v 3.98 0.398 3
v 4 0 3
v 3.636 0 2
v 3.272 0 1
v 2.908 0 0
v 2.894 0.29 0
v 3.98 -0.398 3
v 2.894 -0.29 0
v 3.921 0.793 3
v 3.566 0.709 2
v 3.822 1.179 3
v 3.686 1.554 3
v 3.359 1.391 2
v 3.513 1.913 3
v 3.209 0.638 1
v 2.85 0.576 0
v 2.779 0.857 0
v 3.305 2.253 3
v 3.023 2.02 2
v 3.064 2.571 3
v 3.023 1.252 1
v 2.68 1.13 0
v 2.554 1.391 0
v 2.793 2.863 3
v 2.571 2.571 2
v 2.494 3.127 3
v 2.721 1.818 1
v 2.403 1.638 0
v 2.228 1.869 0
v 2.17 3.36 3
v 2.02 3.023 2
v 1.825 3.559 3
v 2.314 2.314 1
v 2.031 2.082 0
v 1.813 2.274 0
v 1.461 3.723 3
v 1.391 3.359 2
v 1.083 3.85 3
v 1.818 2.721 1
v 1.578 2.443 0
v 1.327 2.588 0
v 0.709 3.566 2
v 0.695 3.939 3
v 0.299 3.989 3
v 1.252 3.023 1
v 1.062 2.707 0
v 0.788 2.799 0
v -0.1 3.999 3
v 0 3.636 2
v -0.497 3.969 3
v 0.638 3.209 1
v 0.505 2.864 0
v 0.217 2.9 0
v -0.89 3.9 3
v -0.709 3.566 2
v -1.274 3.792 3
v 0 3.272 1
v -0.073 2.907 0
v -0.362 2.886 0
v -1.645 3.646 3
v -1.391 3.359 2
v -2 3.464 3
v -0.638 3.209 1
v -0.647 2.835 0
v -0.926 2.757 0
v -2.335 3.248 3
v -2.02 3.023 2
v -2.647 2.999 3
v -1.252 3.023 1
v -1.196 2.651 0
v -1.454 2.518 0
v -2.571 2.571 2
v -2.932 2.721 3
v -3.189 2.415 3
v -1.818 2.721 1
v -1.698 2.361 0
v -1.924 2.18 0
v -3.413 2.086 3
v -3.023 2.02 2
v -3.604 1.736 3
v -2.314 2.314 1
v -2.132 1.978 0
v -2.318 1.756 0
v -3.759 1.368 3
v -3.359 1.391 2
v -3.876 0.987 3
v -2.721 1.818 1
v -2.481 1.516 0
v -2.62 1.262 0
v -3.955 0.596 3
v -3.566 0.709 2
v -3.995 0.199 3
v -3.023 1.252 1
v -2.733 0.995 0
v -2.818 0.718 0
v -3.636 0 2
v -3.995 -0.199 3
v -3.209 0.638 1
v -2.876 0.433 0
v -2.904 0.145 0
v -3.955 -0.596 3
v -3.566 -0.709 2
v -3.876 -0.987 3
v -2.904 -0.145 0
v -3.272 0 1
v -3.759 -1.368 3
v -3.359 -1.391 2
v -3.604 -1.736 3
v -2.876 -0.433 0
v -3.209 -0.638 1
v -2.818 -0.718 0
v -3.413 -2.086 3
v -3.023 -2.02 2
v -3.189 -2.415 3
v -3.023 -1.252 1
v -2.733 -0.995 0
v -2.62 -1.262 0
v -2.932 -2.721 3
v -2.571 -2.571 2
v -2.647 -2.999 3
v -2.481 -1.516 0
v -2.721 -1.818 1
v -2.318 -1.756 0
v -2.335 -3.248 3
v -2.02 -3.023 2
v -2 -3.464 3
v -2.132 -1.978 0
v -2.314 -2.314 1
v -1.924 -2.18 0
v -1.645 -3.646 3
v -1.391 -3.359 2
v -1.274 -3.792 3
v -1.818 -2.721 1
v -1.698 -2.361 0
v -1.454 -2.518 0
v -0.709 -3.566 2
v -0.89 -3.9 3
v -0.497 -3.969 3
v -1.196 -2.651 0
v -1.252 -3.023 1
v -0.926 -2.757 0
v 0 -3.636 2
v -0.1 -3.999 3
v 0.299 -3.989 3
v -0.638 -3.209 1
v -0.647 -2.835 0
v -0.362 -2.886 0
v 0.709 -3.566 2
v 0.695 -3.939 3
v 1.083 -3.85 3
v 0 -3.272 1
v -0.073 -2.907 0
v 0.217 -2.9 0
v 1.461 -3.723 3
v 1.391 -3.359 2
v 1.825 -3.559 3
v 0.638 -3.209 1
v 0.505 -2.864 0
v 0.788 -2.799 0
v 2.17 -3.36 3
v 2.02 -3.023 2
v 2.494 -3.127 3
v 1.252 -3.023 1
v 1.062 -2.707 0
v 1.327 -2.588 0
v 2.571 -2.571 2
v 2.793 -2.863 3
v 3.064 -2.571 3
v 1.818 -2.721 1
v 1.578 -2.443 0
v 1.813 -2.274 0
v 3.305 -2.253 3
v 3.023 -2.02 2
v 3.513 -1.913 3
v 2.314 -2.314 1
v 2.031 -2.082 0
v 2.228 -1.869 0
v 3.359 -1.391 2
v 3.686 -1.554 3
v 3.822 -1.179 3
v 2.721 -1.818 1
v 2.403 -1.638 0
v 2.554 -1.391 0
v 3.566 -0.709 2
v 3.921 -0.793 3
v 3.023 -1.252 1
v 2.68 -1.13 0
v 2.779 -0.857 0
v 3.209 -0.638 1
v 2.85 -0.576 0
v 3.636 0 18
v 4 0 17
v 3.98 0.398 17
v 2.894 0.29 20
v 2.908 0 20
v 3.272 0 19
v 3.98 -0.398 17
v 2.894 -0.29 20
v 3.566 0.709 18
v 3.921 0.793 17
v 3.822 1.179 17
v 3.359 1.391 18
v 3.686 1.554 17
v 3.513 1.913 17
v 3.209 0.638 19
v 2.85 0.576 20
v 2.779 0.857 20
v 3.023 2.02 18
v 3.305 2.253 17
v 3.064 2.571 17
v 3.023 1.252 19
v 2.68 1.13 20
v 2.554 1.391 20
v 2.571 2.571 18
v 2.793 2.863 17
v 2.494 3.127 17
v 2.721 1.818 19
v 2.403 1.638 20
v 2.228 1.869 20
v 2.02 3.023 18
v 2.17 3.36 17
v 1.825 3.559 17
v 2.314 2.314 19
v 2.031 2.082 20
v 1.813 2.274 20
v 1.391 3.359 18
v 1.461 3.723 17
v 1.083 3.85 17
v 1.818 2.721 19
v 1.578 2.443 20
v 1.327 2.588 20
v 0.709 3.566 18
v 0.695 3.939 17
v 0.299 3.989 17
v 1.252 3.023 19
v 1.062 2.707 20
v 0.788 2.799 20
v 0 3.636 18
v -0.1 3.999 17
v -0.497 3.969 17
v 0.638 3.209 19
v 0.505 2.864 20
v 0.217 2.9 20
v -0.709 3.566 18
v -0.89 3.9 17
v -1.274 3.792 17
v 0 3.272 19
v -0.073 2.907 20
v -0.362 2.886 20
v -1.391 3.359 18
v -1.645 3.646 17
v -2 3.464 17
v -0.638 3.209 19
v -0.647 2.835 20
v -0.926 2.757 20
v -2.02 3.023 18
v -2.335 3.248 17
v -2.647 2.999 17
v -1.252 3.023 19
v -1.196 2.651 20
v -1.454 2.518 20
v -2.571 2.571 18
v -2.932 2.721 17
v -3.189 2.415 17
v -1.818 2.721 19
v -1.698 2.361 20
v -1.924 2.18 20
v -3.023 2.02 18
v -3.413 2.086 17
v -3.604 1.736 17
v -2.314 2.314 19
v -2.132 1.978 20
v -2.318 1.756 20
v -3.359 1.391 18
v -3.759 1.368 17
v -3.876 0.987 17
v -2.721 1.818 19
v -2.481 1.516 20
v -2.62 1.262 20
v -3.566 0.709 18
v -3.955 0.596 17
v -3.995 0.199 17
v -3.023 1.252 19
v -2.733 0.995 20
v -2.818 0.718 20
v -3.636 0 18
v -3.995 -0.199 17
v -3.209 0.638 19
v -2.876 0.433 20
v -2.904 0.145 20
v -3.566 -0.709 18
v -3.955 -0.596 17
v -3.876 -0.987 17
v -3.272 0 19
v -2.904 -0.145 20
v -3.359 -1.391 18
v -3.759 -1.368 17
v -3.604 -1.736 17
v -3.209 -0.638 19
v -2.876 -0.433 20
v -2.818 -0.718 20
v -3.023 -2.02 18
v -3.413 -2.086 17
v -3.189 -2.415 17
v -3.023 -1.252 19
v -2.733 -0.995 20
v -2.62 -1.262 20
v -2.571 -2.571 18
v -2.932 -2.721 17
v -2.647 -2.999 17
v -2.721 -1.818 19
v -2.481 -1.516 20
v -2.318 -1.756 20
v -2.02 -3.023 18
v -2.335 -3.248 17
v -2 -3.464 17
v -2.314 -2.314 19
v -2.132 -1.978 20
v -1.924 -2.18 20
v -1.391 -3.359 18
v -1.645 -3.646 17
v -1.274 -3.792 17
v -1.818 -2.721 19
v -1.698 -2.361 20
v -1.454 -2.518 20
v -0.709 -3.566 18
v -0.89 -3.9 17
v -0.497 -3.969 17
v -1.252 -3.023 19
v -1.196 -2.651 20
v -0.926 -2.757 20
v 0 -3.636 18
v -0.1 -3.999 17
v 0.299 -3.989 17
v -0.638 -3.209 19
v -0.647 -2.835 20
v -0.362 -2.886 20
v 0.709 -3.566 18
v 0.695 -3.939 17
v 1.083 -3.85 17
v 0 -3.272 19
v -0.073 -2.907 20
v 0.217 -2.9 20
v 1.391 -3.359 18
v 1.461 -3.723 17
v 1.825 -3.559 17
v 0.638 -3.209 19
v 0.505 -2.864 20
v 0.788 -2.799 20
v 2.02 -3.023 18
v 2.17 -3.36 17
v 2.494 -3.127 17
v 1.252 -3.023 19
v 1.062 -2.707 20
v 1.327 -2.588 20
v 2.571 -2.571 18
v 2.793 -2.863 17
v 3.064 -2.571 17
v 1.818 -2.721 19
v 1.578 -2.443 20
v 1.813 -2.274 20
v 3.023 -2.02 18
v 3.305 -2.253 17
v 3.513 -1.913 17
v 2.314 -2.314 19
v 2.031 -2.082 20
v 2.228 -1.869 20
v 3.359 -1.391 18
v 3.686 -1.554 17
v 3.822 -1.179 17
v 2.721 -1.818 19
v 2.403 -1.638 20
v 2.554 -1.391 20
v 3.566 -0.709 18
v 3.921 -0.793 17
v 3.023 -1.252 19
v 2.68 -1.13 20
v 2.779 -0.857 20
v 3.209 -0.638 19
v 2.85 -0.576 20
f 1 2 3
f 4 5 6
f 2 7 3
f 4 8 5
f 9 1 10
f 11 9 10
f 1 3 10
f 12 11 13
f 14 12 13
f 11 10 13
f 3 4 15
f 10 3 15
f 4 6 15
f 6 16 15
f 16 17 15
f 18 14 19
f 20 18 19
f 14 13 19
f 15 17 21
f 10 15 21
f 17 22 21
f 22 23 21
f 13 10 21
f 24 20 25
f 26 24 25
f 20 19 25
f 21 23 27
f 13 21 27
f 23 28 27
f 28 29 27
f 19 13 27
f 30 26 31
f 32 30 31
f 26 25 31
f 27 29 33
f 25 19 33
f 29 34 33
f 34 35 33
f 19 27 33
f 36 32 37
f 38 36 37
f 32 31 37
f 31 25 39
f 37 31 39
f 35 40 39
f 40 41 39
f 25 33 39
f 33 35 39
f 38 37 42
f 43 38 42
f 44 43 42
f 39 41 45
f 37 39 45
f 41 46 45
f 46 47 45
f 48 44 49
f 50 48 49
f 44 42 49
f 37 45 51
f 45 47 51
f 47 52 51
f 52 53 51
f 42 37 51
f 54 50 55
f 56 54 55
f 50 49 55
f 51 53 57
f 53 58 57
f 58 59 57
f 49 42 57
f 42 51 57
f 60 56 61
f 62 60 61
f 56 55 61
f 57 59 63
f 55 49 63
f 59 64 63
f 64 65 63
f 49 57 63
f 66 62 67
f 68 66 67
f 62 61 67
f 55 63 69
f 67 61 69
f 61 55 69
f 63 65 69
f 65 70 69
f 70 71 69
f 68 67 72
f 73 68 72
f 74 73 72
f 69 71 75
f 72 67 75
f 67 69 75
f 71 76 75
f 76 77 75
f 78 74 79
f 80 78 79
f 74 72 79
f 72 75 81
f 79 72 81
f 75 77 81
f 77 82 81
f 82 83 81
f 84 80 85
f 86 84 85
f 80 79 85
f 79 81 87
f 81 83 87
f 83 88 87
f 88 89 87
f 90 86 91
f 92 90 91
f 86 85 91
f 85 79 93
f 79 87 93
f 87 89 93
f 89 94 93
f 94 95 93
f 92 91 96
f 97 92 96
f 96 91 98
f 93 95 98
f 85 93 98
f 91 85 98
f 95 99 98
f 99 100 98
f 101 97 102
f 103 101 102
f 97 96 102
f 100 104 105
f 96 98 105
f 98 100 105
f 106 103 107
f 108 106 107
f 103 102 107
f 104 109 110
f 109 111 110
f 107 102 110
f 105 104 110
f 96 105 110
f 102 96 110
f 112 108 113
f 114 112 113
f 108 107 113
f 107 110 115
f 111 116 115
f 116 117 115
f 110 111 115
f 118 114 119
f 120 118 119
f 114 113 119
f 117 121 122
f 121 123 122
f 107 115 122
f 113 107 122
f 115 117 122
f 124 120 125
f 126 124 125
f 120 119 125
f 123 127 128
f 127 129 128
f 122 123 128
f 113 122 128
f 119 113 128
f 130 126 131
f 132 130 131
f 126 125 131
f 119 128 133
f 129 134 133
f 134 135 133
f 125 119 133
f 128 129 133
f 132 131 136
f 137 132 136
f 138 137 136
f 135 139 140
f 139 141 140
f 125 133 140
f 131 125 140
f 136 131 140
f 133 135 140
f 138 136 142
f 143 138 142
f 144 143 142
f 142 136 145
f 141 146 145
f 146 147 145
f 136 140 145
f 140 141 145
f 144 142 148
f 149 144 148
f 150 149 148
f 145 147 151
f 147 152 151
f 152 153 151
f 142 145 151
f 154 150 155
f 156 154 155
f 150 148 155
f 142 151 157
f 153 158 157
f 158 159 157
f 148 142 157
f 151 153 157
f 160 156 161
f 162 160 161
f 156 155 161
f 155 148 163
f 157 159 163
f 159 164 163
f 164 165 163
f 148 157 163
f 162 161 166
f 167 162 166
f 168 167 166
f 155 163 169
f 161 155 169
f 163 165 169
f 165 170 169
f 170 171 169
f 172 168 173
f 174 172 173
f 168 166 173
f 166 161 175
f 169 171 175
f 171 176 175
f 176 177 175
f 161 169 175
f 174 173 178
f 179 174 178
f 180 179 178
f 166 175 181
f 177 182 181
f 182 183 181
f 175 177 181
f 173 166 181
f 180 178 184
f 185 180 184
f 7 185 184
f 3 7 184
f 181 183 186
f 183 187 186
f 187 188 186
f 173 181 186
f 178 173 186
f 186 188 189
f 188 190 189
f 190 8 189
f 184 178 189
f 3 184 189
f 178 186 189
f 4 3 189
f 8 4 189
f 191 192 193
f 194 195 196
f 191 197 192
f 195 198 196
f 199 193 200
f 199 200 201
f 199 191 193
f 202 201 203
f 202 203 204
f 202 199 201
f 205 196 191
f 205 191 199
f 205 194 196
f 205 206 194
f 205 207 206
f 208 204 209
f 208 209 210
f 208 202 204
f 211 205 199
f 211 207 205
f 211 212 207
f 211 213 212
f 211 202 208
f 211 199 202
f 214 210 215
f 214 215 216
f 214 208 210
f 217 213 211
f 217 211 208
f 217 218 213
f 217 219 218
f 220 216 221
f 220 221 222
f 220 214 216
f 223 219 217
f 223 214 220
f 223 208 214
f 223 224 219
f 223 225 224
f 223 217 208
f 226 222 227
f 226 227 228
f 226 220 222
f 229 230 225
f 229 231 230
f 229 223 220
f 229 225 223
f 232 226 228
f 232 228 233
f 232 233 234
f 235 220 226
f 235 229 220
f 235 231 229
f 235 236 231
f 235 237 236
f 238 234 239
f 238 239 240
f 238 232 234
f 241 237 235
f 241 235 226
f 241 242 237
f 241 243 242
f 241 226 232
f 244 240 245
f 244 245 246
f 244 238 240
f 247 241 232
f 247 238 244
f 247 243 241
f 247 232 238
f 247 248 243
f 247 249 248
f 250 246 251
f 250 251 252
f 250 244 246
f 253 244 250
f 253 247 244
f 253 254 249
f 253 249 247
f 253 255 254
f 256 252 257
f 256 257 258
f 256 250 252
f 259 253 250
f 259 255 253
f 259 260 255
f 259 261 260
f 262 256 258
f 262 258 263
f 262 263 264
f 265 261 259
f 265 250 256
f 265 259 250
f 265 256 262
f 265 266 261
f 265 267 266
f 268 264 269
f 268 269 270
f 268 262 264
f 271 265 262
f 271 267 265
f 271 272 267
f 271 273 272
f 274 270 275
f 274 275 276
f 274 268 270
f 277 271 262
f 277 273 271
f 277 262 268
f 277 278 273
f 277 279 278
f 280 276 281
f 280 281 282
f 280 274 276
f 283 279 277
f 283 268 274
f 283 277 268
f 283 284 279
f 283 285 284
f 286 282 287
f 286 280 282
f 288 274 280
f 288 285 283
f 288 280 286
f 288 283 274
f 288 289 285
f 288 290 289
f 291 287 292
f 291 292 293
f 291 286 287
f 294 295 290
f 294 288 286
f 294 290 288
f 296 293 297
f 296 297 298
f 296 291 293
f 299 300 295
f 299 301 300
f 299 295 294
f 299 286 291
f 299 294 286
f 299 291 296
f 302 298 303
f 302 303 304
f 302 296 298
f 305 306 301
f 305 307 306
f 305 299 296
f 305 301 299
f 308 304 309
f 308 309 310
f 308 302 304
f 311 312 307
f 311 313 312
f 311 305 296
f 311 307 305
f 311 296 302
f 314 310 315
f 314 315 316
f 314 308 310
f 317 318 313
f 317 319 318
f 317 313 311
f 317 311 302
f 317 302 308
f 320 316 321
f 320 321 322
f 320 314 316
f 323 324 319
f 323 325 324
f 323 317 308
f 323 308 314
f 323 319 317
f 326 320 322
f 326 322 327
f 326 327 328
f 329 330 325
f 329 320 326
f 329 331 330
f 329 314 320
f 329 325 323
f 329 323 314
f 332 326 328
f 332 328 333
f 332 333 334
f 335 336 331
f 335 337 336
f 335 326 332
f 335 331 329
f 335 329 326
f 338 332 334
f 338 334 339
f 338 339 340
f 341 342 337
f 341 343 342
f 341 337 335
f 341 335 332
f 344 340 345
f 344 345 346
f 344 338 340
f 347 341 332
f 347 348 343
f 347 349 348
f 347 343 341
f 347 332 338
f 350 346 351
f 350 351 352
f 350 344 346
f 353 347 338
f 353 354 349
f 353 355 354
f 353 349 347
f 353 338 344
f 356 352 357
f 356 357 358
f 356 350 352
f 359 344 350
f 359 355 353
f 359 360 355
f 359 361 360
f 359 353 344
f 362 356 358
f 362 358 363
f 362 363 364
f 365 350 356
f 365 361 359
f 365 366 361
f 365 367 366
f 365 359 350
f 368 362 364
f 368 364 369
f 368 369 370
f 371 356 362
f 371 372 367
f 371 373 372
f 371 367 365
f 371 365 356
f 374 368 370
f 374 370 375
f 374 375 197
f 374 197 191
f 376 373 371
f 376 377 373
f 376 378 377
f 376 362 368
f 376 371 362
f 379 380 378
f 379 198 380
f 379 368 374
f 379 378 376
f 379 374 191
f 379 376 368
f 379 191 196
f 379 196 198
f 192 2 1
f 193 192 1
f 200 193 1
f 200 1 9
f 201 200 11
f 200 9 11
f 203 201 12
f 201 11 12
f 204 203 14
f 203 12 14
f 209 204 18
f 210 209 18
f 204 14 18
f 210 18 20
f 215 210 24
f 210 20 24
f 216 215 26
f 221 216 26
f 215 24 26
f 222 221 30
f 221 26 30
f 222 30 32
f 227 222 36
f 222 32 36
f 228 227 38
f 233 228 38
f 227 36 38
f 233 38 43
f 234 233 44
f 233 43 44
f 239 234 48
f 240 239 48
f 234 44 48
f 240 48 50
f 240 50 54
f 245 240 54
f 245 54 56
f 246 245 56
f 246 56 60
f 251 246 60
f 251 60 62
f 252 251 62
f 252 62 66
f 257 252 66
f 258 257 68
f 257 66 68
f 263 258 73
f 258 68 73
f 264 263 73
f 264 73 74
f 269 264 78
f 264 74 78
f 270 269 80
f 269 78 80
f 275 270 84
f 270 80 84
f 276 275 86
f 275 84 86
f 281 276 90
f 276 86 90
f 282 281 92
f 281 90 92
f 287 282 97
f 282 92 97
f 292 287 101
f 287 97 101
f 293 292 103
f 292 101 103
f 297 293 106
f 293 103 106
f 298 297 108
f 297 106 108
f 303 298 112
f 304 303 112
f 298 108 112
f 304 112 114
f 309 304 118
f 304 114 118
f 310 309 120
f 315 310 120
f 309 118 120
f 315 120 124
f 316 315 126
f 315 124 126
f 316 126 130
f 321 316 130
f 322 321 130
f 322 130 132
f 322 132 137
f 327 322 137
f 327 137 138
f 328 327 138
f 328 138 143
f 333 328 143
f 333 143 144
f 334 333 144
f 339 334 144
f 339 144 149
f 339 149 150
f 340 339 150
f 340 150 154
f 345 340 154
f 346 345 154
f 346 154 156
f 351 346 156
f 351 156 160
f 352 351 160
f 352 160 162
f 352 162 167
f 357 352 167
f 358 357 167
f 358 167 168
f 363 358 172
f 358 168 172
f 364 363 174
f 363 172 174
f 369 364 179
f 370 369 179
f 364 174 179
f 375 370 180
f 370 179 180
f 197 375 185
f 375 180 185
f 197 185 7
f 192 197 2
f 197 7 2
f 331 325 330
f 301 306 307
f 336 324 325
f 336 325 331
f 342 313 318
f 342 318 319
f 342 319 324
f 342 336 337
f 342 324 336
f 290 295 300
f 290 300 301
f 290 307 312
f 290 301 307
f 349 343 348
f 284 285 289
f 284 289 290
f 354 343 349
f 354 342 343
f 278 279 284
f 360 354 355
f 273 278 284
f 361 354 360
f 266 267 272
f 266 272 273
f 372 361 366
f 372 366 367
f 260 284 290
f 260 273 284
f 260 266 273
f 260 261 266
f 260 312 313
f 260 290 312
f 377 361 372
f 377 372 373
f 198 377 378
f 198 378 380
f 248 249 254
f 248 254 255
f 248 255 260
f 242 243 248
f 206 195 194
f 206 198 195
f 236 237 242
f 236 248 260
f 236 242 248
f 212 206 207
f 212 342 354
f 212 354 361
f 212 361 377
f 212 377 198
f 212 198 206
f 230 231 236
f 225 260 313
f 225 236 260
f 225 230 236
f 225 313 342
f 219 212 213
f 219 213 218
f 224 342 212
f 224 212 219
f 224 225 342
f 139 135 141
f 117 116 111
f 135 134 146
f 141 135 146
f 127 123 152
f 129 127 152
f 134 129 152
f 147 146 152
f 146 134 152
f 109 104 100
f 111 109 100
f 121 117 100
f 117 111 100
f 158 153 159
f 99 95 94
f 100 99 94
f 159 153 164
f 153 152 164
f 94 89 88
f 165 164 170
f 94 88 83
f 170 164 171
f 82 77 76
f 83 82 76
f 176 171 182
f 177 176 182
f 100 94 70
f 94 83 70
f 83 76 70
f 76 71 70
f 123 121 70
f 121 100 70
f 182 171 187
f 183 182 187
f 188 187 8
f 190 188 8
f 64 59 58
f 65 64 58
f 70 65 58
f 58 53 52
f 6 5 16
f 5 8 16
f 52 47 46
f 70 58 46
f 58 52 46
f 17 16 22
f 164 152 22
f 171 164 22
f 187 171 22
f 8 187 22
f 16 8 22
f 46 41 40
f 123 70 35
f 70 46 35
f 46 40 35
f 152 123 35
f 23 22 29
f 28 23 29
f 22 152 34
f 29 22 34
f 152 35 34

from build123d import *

# Parameters (mm, degrees)
SKETCH1_R      = 4
EXTRUDE1_DEPTH = 20
CHAMFER2_SIZE  = 3
CHAMFER2_SIZE2 = 1.091910703
CHAMFER3_SIZE  = 3
CHAMFER3_SIZE2 = 1.091910703


with BuildPart() as part:
    # Sketch1 → Extrude1 (new body)
    with BuildSketch(Plane.XY):
        Circle(SKETCH1_R)
    extrude(amount=EXTRUDE1_DEPTH)

    # Chamfer2
    chamfer2_edges = [part.edges().sort_by_distance(p)[0] for p in [
        (-4, 0, 20),
    ]]
    chamfer2_side = [part.faces().sort_by_distance(p)[0] for p in [
        (-4, 0, 10),
    ]]
    chamfer(chamfer2_edges, length=CHAMFER2_SIZE, length2=CHAMFER2_SIZE2, reference=chamfer2_side[0])

    # Chamfer3
    chamfer3_edges = [part.edges().sort_by_distance(p)[0] for p in [
        (-4, 0, 0),
    ]]
    chamfer3_side = [part.faces().sort_by_distance(p)[0] for p in [
        (-4, 0, 8.5),
    ]]
    chamfer(chamfer3_edges, length=CHAMFER3_SIZE, length2=CHAMFER3_SIZE2, reference=chamfer3_side[0])


solid = part.part
